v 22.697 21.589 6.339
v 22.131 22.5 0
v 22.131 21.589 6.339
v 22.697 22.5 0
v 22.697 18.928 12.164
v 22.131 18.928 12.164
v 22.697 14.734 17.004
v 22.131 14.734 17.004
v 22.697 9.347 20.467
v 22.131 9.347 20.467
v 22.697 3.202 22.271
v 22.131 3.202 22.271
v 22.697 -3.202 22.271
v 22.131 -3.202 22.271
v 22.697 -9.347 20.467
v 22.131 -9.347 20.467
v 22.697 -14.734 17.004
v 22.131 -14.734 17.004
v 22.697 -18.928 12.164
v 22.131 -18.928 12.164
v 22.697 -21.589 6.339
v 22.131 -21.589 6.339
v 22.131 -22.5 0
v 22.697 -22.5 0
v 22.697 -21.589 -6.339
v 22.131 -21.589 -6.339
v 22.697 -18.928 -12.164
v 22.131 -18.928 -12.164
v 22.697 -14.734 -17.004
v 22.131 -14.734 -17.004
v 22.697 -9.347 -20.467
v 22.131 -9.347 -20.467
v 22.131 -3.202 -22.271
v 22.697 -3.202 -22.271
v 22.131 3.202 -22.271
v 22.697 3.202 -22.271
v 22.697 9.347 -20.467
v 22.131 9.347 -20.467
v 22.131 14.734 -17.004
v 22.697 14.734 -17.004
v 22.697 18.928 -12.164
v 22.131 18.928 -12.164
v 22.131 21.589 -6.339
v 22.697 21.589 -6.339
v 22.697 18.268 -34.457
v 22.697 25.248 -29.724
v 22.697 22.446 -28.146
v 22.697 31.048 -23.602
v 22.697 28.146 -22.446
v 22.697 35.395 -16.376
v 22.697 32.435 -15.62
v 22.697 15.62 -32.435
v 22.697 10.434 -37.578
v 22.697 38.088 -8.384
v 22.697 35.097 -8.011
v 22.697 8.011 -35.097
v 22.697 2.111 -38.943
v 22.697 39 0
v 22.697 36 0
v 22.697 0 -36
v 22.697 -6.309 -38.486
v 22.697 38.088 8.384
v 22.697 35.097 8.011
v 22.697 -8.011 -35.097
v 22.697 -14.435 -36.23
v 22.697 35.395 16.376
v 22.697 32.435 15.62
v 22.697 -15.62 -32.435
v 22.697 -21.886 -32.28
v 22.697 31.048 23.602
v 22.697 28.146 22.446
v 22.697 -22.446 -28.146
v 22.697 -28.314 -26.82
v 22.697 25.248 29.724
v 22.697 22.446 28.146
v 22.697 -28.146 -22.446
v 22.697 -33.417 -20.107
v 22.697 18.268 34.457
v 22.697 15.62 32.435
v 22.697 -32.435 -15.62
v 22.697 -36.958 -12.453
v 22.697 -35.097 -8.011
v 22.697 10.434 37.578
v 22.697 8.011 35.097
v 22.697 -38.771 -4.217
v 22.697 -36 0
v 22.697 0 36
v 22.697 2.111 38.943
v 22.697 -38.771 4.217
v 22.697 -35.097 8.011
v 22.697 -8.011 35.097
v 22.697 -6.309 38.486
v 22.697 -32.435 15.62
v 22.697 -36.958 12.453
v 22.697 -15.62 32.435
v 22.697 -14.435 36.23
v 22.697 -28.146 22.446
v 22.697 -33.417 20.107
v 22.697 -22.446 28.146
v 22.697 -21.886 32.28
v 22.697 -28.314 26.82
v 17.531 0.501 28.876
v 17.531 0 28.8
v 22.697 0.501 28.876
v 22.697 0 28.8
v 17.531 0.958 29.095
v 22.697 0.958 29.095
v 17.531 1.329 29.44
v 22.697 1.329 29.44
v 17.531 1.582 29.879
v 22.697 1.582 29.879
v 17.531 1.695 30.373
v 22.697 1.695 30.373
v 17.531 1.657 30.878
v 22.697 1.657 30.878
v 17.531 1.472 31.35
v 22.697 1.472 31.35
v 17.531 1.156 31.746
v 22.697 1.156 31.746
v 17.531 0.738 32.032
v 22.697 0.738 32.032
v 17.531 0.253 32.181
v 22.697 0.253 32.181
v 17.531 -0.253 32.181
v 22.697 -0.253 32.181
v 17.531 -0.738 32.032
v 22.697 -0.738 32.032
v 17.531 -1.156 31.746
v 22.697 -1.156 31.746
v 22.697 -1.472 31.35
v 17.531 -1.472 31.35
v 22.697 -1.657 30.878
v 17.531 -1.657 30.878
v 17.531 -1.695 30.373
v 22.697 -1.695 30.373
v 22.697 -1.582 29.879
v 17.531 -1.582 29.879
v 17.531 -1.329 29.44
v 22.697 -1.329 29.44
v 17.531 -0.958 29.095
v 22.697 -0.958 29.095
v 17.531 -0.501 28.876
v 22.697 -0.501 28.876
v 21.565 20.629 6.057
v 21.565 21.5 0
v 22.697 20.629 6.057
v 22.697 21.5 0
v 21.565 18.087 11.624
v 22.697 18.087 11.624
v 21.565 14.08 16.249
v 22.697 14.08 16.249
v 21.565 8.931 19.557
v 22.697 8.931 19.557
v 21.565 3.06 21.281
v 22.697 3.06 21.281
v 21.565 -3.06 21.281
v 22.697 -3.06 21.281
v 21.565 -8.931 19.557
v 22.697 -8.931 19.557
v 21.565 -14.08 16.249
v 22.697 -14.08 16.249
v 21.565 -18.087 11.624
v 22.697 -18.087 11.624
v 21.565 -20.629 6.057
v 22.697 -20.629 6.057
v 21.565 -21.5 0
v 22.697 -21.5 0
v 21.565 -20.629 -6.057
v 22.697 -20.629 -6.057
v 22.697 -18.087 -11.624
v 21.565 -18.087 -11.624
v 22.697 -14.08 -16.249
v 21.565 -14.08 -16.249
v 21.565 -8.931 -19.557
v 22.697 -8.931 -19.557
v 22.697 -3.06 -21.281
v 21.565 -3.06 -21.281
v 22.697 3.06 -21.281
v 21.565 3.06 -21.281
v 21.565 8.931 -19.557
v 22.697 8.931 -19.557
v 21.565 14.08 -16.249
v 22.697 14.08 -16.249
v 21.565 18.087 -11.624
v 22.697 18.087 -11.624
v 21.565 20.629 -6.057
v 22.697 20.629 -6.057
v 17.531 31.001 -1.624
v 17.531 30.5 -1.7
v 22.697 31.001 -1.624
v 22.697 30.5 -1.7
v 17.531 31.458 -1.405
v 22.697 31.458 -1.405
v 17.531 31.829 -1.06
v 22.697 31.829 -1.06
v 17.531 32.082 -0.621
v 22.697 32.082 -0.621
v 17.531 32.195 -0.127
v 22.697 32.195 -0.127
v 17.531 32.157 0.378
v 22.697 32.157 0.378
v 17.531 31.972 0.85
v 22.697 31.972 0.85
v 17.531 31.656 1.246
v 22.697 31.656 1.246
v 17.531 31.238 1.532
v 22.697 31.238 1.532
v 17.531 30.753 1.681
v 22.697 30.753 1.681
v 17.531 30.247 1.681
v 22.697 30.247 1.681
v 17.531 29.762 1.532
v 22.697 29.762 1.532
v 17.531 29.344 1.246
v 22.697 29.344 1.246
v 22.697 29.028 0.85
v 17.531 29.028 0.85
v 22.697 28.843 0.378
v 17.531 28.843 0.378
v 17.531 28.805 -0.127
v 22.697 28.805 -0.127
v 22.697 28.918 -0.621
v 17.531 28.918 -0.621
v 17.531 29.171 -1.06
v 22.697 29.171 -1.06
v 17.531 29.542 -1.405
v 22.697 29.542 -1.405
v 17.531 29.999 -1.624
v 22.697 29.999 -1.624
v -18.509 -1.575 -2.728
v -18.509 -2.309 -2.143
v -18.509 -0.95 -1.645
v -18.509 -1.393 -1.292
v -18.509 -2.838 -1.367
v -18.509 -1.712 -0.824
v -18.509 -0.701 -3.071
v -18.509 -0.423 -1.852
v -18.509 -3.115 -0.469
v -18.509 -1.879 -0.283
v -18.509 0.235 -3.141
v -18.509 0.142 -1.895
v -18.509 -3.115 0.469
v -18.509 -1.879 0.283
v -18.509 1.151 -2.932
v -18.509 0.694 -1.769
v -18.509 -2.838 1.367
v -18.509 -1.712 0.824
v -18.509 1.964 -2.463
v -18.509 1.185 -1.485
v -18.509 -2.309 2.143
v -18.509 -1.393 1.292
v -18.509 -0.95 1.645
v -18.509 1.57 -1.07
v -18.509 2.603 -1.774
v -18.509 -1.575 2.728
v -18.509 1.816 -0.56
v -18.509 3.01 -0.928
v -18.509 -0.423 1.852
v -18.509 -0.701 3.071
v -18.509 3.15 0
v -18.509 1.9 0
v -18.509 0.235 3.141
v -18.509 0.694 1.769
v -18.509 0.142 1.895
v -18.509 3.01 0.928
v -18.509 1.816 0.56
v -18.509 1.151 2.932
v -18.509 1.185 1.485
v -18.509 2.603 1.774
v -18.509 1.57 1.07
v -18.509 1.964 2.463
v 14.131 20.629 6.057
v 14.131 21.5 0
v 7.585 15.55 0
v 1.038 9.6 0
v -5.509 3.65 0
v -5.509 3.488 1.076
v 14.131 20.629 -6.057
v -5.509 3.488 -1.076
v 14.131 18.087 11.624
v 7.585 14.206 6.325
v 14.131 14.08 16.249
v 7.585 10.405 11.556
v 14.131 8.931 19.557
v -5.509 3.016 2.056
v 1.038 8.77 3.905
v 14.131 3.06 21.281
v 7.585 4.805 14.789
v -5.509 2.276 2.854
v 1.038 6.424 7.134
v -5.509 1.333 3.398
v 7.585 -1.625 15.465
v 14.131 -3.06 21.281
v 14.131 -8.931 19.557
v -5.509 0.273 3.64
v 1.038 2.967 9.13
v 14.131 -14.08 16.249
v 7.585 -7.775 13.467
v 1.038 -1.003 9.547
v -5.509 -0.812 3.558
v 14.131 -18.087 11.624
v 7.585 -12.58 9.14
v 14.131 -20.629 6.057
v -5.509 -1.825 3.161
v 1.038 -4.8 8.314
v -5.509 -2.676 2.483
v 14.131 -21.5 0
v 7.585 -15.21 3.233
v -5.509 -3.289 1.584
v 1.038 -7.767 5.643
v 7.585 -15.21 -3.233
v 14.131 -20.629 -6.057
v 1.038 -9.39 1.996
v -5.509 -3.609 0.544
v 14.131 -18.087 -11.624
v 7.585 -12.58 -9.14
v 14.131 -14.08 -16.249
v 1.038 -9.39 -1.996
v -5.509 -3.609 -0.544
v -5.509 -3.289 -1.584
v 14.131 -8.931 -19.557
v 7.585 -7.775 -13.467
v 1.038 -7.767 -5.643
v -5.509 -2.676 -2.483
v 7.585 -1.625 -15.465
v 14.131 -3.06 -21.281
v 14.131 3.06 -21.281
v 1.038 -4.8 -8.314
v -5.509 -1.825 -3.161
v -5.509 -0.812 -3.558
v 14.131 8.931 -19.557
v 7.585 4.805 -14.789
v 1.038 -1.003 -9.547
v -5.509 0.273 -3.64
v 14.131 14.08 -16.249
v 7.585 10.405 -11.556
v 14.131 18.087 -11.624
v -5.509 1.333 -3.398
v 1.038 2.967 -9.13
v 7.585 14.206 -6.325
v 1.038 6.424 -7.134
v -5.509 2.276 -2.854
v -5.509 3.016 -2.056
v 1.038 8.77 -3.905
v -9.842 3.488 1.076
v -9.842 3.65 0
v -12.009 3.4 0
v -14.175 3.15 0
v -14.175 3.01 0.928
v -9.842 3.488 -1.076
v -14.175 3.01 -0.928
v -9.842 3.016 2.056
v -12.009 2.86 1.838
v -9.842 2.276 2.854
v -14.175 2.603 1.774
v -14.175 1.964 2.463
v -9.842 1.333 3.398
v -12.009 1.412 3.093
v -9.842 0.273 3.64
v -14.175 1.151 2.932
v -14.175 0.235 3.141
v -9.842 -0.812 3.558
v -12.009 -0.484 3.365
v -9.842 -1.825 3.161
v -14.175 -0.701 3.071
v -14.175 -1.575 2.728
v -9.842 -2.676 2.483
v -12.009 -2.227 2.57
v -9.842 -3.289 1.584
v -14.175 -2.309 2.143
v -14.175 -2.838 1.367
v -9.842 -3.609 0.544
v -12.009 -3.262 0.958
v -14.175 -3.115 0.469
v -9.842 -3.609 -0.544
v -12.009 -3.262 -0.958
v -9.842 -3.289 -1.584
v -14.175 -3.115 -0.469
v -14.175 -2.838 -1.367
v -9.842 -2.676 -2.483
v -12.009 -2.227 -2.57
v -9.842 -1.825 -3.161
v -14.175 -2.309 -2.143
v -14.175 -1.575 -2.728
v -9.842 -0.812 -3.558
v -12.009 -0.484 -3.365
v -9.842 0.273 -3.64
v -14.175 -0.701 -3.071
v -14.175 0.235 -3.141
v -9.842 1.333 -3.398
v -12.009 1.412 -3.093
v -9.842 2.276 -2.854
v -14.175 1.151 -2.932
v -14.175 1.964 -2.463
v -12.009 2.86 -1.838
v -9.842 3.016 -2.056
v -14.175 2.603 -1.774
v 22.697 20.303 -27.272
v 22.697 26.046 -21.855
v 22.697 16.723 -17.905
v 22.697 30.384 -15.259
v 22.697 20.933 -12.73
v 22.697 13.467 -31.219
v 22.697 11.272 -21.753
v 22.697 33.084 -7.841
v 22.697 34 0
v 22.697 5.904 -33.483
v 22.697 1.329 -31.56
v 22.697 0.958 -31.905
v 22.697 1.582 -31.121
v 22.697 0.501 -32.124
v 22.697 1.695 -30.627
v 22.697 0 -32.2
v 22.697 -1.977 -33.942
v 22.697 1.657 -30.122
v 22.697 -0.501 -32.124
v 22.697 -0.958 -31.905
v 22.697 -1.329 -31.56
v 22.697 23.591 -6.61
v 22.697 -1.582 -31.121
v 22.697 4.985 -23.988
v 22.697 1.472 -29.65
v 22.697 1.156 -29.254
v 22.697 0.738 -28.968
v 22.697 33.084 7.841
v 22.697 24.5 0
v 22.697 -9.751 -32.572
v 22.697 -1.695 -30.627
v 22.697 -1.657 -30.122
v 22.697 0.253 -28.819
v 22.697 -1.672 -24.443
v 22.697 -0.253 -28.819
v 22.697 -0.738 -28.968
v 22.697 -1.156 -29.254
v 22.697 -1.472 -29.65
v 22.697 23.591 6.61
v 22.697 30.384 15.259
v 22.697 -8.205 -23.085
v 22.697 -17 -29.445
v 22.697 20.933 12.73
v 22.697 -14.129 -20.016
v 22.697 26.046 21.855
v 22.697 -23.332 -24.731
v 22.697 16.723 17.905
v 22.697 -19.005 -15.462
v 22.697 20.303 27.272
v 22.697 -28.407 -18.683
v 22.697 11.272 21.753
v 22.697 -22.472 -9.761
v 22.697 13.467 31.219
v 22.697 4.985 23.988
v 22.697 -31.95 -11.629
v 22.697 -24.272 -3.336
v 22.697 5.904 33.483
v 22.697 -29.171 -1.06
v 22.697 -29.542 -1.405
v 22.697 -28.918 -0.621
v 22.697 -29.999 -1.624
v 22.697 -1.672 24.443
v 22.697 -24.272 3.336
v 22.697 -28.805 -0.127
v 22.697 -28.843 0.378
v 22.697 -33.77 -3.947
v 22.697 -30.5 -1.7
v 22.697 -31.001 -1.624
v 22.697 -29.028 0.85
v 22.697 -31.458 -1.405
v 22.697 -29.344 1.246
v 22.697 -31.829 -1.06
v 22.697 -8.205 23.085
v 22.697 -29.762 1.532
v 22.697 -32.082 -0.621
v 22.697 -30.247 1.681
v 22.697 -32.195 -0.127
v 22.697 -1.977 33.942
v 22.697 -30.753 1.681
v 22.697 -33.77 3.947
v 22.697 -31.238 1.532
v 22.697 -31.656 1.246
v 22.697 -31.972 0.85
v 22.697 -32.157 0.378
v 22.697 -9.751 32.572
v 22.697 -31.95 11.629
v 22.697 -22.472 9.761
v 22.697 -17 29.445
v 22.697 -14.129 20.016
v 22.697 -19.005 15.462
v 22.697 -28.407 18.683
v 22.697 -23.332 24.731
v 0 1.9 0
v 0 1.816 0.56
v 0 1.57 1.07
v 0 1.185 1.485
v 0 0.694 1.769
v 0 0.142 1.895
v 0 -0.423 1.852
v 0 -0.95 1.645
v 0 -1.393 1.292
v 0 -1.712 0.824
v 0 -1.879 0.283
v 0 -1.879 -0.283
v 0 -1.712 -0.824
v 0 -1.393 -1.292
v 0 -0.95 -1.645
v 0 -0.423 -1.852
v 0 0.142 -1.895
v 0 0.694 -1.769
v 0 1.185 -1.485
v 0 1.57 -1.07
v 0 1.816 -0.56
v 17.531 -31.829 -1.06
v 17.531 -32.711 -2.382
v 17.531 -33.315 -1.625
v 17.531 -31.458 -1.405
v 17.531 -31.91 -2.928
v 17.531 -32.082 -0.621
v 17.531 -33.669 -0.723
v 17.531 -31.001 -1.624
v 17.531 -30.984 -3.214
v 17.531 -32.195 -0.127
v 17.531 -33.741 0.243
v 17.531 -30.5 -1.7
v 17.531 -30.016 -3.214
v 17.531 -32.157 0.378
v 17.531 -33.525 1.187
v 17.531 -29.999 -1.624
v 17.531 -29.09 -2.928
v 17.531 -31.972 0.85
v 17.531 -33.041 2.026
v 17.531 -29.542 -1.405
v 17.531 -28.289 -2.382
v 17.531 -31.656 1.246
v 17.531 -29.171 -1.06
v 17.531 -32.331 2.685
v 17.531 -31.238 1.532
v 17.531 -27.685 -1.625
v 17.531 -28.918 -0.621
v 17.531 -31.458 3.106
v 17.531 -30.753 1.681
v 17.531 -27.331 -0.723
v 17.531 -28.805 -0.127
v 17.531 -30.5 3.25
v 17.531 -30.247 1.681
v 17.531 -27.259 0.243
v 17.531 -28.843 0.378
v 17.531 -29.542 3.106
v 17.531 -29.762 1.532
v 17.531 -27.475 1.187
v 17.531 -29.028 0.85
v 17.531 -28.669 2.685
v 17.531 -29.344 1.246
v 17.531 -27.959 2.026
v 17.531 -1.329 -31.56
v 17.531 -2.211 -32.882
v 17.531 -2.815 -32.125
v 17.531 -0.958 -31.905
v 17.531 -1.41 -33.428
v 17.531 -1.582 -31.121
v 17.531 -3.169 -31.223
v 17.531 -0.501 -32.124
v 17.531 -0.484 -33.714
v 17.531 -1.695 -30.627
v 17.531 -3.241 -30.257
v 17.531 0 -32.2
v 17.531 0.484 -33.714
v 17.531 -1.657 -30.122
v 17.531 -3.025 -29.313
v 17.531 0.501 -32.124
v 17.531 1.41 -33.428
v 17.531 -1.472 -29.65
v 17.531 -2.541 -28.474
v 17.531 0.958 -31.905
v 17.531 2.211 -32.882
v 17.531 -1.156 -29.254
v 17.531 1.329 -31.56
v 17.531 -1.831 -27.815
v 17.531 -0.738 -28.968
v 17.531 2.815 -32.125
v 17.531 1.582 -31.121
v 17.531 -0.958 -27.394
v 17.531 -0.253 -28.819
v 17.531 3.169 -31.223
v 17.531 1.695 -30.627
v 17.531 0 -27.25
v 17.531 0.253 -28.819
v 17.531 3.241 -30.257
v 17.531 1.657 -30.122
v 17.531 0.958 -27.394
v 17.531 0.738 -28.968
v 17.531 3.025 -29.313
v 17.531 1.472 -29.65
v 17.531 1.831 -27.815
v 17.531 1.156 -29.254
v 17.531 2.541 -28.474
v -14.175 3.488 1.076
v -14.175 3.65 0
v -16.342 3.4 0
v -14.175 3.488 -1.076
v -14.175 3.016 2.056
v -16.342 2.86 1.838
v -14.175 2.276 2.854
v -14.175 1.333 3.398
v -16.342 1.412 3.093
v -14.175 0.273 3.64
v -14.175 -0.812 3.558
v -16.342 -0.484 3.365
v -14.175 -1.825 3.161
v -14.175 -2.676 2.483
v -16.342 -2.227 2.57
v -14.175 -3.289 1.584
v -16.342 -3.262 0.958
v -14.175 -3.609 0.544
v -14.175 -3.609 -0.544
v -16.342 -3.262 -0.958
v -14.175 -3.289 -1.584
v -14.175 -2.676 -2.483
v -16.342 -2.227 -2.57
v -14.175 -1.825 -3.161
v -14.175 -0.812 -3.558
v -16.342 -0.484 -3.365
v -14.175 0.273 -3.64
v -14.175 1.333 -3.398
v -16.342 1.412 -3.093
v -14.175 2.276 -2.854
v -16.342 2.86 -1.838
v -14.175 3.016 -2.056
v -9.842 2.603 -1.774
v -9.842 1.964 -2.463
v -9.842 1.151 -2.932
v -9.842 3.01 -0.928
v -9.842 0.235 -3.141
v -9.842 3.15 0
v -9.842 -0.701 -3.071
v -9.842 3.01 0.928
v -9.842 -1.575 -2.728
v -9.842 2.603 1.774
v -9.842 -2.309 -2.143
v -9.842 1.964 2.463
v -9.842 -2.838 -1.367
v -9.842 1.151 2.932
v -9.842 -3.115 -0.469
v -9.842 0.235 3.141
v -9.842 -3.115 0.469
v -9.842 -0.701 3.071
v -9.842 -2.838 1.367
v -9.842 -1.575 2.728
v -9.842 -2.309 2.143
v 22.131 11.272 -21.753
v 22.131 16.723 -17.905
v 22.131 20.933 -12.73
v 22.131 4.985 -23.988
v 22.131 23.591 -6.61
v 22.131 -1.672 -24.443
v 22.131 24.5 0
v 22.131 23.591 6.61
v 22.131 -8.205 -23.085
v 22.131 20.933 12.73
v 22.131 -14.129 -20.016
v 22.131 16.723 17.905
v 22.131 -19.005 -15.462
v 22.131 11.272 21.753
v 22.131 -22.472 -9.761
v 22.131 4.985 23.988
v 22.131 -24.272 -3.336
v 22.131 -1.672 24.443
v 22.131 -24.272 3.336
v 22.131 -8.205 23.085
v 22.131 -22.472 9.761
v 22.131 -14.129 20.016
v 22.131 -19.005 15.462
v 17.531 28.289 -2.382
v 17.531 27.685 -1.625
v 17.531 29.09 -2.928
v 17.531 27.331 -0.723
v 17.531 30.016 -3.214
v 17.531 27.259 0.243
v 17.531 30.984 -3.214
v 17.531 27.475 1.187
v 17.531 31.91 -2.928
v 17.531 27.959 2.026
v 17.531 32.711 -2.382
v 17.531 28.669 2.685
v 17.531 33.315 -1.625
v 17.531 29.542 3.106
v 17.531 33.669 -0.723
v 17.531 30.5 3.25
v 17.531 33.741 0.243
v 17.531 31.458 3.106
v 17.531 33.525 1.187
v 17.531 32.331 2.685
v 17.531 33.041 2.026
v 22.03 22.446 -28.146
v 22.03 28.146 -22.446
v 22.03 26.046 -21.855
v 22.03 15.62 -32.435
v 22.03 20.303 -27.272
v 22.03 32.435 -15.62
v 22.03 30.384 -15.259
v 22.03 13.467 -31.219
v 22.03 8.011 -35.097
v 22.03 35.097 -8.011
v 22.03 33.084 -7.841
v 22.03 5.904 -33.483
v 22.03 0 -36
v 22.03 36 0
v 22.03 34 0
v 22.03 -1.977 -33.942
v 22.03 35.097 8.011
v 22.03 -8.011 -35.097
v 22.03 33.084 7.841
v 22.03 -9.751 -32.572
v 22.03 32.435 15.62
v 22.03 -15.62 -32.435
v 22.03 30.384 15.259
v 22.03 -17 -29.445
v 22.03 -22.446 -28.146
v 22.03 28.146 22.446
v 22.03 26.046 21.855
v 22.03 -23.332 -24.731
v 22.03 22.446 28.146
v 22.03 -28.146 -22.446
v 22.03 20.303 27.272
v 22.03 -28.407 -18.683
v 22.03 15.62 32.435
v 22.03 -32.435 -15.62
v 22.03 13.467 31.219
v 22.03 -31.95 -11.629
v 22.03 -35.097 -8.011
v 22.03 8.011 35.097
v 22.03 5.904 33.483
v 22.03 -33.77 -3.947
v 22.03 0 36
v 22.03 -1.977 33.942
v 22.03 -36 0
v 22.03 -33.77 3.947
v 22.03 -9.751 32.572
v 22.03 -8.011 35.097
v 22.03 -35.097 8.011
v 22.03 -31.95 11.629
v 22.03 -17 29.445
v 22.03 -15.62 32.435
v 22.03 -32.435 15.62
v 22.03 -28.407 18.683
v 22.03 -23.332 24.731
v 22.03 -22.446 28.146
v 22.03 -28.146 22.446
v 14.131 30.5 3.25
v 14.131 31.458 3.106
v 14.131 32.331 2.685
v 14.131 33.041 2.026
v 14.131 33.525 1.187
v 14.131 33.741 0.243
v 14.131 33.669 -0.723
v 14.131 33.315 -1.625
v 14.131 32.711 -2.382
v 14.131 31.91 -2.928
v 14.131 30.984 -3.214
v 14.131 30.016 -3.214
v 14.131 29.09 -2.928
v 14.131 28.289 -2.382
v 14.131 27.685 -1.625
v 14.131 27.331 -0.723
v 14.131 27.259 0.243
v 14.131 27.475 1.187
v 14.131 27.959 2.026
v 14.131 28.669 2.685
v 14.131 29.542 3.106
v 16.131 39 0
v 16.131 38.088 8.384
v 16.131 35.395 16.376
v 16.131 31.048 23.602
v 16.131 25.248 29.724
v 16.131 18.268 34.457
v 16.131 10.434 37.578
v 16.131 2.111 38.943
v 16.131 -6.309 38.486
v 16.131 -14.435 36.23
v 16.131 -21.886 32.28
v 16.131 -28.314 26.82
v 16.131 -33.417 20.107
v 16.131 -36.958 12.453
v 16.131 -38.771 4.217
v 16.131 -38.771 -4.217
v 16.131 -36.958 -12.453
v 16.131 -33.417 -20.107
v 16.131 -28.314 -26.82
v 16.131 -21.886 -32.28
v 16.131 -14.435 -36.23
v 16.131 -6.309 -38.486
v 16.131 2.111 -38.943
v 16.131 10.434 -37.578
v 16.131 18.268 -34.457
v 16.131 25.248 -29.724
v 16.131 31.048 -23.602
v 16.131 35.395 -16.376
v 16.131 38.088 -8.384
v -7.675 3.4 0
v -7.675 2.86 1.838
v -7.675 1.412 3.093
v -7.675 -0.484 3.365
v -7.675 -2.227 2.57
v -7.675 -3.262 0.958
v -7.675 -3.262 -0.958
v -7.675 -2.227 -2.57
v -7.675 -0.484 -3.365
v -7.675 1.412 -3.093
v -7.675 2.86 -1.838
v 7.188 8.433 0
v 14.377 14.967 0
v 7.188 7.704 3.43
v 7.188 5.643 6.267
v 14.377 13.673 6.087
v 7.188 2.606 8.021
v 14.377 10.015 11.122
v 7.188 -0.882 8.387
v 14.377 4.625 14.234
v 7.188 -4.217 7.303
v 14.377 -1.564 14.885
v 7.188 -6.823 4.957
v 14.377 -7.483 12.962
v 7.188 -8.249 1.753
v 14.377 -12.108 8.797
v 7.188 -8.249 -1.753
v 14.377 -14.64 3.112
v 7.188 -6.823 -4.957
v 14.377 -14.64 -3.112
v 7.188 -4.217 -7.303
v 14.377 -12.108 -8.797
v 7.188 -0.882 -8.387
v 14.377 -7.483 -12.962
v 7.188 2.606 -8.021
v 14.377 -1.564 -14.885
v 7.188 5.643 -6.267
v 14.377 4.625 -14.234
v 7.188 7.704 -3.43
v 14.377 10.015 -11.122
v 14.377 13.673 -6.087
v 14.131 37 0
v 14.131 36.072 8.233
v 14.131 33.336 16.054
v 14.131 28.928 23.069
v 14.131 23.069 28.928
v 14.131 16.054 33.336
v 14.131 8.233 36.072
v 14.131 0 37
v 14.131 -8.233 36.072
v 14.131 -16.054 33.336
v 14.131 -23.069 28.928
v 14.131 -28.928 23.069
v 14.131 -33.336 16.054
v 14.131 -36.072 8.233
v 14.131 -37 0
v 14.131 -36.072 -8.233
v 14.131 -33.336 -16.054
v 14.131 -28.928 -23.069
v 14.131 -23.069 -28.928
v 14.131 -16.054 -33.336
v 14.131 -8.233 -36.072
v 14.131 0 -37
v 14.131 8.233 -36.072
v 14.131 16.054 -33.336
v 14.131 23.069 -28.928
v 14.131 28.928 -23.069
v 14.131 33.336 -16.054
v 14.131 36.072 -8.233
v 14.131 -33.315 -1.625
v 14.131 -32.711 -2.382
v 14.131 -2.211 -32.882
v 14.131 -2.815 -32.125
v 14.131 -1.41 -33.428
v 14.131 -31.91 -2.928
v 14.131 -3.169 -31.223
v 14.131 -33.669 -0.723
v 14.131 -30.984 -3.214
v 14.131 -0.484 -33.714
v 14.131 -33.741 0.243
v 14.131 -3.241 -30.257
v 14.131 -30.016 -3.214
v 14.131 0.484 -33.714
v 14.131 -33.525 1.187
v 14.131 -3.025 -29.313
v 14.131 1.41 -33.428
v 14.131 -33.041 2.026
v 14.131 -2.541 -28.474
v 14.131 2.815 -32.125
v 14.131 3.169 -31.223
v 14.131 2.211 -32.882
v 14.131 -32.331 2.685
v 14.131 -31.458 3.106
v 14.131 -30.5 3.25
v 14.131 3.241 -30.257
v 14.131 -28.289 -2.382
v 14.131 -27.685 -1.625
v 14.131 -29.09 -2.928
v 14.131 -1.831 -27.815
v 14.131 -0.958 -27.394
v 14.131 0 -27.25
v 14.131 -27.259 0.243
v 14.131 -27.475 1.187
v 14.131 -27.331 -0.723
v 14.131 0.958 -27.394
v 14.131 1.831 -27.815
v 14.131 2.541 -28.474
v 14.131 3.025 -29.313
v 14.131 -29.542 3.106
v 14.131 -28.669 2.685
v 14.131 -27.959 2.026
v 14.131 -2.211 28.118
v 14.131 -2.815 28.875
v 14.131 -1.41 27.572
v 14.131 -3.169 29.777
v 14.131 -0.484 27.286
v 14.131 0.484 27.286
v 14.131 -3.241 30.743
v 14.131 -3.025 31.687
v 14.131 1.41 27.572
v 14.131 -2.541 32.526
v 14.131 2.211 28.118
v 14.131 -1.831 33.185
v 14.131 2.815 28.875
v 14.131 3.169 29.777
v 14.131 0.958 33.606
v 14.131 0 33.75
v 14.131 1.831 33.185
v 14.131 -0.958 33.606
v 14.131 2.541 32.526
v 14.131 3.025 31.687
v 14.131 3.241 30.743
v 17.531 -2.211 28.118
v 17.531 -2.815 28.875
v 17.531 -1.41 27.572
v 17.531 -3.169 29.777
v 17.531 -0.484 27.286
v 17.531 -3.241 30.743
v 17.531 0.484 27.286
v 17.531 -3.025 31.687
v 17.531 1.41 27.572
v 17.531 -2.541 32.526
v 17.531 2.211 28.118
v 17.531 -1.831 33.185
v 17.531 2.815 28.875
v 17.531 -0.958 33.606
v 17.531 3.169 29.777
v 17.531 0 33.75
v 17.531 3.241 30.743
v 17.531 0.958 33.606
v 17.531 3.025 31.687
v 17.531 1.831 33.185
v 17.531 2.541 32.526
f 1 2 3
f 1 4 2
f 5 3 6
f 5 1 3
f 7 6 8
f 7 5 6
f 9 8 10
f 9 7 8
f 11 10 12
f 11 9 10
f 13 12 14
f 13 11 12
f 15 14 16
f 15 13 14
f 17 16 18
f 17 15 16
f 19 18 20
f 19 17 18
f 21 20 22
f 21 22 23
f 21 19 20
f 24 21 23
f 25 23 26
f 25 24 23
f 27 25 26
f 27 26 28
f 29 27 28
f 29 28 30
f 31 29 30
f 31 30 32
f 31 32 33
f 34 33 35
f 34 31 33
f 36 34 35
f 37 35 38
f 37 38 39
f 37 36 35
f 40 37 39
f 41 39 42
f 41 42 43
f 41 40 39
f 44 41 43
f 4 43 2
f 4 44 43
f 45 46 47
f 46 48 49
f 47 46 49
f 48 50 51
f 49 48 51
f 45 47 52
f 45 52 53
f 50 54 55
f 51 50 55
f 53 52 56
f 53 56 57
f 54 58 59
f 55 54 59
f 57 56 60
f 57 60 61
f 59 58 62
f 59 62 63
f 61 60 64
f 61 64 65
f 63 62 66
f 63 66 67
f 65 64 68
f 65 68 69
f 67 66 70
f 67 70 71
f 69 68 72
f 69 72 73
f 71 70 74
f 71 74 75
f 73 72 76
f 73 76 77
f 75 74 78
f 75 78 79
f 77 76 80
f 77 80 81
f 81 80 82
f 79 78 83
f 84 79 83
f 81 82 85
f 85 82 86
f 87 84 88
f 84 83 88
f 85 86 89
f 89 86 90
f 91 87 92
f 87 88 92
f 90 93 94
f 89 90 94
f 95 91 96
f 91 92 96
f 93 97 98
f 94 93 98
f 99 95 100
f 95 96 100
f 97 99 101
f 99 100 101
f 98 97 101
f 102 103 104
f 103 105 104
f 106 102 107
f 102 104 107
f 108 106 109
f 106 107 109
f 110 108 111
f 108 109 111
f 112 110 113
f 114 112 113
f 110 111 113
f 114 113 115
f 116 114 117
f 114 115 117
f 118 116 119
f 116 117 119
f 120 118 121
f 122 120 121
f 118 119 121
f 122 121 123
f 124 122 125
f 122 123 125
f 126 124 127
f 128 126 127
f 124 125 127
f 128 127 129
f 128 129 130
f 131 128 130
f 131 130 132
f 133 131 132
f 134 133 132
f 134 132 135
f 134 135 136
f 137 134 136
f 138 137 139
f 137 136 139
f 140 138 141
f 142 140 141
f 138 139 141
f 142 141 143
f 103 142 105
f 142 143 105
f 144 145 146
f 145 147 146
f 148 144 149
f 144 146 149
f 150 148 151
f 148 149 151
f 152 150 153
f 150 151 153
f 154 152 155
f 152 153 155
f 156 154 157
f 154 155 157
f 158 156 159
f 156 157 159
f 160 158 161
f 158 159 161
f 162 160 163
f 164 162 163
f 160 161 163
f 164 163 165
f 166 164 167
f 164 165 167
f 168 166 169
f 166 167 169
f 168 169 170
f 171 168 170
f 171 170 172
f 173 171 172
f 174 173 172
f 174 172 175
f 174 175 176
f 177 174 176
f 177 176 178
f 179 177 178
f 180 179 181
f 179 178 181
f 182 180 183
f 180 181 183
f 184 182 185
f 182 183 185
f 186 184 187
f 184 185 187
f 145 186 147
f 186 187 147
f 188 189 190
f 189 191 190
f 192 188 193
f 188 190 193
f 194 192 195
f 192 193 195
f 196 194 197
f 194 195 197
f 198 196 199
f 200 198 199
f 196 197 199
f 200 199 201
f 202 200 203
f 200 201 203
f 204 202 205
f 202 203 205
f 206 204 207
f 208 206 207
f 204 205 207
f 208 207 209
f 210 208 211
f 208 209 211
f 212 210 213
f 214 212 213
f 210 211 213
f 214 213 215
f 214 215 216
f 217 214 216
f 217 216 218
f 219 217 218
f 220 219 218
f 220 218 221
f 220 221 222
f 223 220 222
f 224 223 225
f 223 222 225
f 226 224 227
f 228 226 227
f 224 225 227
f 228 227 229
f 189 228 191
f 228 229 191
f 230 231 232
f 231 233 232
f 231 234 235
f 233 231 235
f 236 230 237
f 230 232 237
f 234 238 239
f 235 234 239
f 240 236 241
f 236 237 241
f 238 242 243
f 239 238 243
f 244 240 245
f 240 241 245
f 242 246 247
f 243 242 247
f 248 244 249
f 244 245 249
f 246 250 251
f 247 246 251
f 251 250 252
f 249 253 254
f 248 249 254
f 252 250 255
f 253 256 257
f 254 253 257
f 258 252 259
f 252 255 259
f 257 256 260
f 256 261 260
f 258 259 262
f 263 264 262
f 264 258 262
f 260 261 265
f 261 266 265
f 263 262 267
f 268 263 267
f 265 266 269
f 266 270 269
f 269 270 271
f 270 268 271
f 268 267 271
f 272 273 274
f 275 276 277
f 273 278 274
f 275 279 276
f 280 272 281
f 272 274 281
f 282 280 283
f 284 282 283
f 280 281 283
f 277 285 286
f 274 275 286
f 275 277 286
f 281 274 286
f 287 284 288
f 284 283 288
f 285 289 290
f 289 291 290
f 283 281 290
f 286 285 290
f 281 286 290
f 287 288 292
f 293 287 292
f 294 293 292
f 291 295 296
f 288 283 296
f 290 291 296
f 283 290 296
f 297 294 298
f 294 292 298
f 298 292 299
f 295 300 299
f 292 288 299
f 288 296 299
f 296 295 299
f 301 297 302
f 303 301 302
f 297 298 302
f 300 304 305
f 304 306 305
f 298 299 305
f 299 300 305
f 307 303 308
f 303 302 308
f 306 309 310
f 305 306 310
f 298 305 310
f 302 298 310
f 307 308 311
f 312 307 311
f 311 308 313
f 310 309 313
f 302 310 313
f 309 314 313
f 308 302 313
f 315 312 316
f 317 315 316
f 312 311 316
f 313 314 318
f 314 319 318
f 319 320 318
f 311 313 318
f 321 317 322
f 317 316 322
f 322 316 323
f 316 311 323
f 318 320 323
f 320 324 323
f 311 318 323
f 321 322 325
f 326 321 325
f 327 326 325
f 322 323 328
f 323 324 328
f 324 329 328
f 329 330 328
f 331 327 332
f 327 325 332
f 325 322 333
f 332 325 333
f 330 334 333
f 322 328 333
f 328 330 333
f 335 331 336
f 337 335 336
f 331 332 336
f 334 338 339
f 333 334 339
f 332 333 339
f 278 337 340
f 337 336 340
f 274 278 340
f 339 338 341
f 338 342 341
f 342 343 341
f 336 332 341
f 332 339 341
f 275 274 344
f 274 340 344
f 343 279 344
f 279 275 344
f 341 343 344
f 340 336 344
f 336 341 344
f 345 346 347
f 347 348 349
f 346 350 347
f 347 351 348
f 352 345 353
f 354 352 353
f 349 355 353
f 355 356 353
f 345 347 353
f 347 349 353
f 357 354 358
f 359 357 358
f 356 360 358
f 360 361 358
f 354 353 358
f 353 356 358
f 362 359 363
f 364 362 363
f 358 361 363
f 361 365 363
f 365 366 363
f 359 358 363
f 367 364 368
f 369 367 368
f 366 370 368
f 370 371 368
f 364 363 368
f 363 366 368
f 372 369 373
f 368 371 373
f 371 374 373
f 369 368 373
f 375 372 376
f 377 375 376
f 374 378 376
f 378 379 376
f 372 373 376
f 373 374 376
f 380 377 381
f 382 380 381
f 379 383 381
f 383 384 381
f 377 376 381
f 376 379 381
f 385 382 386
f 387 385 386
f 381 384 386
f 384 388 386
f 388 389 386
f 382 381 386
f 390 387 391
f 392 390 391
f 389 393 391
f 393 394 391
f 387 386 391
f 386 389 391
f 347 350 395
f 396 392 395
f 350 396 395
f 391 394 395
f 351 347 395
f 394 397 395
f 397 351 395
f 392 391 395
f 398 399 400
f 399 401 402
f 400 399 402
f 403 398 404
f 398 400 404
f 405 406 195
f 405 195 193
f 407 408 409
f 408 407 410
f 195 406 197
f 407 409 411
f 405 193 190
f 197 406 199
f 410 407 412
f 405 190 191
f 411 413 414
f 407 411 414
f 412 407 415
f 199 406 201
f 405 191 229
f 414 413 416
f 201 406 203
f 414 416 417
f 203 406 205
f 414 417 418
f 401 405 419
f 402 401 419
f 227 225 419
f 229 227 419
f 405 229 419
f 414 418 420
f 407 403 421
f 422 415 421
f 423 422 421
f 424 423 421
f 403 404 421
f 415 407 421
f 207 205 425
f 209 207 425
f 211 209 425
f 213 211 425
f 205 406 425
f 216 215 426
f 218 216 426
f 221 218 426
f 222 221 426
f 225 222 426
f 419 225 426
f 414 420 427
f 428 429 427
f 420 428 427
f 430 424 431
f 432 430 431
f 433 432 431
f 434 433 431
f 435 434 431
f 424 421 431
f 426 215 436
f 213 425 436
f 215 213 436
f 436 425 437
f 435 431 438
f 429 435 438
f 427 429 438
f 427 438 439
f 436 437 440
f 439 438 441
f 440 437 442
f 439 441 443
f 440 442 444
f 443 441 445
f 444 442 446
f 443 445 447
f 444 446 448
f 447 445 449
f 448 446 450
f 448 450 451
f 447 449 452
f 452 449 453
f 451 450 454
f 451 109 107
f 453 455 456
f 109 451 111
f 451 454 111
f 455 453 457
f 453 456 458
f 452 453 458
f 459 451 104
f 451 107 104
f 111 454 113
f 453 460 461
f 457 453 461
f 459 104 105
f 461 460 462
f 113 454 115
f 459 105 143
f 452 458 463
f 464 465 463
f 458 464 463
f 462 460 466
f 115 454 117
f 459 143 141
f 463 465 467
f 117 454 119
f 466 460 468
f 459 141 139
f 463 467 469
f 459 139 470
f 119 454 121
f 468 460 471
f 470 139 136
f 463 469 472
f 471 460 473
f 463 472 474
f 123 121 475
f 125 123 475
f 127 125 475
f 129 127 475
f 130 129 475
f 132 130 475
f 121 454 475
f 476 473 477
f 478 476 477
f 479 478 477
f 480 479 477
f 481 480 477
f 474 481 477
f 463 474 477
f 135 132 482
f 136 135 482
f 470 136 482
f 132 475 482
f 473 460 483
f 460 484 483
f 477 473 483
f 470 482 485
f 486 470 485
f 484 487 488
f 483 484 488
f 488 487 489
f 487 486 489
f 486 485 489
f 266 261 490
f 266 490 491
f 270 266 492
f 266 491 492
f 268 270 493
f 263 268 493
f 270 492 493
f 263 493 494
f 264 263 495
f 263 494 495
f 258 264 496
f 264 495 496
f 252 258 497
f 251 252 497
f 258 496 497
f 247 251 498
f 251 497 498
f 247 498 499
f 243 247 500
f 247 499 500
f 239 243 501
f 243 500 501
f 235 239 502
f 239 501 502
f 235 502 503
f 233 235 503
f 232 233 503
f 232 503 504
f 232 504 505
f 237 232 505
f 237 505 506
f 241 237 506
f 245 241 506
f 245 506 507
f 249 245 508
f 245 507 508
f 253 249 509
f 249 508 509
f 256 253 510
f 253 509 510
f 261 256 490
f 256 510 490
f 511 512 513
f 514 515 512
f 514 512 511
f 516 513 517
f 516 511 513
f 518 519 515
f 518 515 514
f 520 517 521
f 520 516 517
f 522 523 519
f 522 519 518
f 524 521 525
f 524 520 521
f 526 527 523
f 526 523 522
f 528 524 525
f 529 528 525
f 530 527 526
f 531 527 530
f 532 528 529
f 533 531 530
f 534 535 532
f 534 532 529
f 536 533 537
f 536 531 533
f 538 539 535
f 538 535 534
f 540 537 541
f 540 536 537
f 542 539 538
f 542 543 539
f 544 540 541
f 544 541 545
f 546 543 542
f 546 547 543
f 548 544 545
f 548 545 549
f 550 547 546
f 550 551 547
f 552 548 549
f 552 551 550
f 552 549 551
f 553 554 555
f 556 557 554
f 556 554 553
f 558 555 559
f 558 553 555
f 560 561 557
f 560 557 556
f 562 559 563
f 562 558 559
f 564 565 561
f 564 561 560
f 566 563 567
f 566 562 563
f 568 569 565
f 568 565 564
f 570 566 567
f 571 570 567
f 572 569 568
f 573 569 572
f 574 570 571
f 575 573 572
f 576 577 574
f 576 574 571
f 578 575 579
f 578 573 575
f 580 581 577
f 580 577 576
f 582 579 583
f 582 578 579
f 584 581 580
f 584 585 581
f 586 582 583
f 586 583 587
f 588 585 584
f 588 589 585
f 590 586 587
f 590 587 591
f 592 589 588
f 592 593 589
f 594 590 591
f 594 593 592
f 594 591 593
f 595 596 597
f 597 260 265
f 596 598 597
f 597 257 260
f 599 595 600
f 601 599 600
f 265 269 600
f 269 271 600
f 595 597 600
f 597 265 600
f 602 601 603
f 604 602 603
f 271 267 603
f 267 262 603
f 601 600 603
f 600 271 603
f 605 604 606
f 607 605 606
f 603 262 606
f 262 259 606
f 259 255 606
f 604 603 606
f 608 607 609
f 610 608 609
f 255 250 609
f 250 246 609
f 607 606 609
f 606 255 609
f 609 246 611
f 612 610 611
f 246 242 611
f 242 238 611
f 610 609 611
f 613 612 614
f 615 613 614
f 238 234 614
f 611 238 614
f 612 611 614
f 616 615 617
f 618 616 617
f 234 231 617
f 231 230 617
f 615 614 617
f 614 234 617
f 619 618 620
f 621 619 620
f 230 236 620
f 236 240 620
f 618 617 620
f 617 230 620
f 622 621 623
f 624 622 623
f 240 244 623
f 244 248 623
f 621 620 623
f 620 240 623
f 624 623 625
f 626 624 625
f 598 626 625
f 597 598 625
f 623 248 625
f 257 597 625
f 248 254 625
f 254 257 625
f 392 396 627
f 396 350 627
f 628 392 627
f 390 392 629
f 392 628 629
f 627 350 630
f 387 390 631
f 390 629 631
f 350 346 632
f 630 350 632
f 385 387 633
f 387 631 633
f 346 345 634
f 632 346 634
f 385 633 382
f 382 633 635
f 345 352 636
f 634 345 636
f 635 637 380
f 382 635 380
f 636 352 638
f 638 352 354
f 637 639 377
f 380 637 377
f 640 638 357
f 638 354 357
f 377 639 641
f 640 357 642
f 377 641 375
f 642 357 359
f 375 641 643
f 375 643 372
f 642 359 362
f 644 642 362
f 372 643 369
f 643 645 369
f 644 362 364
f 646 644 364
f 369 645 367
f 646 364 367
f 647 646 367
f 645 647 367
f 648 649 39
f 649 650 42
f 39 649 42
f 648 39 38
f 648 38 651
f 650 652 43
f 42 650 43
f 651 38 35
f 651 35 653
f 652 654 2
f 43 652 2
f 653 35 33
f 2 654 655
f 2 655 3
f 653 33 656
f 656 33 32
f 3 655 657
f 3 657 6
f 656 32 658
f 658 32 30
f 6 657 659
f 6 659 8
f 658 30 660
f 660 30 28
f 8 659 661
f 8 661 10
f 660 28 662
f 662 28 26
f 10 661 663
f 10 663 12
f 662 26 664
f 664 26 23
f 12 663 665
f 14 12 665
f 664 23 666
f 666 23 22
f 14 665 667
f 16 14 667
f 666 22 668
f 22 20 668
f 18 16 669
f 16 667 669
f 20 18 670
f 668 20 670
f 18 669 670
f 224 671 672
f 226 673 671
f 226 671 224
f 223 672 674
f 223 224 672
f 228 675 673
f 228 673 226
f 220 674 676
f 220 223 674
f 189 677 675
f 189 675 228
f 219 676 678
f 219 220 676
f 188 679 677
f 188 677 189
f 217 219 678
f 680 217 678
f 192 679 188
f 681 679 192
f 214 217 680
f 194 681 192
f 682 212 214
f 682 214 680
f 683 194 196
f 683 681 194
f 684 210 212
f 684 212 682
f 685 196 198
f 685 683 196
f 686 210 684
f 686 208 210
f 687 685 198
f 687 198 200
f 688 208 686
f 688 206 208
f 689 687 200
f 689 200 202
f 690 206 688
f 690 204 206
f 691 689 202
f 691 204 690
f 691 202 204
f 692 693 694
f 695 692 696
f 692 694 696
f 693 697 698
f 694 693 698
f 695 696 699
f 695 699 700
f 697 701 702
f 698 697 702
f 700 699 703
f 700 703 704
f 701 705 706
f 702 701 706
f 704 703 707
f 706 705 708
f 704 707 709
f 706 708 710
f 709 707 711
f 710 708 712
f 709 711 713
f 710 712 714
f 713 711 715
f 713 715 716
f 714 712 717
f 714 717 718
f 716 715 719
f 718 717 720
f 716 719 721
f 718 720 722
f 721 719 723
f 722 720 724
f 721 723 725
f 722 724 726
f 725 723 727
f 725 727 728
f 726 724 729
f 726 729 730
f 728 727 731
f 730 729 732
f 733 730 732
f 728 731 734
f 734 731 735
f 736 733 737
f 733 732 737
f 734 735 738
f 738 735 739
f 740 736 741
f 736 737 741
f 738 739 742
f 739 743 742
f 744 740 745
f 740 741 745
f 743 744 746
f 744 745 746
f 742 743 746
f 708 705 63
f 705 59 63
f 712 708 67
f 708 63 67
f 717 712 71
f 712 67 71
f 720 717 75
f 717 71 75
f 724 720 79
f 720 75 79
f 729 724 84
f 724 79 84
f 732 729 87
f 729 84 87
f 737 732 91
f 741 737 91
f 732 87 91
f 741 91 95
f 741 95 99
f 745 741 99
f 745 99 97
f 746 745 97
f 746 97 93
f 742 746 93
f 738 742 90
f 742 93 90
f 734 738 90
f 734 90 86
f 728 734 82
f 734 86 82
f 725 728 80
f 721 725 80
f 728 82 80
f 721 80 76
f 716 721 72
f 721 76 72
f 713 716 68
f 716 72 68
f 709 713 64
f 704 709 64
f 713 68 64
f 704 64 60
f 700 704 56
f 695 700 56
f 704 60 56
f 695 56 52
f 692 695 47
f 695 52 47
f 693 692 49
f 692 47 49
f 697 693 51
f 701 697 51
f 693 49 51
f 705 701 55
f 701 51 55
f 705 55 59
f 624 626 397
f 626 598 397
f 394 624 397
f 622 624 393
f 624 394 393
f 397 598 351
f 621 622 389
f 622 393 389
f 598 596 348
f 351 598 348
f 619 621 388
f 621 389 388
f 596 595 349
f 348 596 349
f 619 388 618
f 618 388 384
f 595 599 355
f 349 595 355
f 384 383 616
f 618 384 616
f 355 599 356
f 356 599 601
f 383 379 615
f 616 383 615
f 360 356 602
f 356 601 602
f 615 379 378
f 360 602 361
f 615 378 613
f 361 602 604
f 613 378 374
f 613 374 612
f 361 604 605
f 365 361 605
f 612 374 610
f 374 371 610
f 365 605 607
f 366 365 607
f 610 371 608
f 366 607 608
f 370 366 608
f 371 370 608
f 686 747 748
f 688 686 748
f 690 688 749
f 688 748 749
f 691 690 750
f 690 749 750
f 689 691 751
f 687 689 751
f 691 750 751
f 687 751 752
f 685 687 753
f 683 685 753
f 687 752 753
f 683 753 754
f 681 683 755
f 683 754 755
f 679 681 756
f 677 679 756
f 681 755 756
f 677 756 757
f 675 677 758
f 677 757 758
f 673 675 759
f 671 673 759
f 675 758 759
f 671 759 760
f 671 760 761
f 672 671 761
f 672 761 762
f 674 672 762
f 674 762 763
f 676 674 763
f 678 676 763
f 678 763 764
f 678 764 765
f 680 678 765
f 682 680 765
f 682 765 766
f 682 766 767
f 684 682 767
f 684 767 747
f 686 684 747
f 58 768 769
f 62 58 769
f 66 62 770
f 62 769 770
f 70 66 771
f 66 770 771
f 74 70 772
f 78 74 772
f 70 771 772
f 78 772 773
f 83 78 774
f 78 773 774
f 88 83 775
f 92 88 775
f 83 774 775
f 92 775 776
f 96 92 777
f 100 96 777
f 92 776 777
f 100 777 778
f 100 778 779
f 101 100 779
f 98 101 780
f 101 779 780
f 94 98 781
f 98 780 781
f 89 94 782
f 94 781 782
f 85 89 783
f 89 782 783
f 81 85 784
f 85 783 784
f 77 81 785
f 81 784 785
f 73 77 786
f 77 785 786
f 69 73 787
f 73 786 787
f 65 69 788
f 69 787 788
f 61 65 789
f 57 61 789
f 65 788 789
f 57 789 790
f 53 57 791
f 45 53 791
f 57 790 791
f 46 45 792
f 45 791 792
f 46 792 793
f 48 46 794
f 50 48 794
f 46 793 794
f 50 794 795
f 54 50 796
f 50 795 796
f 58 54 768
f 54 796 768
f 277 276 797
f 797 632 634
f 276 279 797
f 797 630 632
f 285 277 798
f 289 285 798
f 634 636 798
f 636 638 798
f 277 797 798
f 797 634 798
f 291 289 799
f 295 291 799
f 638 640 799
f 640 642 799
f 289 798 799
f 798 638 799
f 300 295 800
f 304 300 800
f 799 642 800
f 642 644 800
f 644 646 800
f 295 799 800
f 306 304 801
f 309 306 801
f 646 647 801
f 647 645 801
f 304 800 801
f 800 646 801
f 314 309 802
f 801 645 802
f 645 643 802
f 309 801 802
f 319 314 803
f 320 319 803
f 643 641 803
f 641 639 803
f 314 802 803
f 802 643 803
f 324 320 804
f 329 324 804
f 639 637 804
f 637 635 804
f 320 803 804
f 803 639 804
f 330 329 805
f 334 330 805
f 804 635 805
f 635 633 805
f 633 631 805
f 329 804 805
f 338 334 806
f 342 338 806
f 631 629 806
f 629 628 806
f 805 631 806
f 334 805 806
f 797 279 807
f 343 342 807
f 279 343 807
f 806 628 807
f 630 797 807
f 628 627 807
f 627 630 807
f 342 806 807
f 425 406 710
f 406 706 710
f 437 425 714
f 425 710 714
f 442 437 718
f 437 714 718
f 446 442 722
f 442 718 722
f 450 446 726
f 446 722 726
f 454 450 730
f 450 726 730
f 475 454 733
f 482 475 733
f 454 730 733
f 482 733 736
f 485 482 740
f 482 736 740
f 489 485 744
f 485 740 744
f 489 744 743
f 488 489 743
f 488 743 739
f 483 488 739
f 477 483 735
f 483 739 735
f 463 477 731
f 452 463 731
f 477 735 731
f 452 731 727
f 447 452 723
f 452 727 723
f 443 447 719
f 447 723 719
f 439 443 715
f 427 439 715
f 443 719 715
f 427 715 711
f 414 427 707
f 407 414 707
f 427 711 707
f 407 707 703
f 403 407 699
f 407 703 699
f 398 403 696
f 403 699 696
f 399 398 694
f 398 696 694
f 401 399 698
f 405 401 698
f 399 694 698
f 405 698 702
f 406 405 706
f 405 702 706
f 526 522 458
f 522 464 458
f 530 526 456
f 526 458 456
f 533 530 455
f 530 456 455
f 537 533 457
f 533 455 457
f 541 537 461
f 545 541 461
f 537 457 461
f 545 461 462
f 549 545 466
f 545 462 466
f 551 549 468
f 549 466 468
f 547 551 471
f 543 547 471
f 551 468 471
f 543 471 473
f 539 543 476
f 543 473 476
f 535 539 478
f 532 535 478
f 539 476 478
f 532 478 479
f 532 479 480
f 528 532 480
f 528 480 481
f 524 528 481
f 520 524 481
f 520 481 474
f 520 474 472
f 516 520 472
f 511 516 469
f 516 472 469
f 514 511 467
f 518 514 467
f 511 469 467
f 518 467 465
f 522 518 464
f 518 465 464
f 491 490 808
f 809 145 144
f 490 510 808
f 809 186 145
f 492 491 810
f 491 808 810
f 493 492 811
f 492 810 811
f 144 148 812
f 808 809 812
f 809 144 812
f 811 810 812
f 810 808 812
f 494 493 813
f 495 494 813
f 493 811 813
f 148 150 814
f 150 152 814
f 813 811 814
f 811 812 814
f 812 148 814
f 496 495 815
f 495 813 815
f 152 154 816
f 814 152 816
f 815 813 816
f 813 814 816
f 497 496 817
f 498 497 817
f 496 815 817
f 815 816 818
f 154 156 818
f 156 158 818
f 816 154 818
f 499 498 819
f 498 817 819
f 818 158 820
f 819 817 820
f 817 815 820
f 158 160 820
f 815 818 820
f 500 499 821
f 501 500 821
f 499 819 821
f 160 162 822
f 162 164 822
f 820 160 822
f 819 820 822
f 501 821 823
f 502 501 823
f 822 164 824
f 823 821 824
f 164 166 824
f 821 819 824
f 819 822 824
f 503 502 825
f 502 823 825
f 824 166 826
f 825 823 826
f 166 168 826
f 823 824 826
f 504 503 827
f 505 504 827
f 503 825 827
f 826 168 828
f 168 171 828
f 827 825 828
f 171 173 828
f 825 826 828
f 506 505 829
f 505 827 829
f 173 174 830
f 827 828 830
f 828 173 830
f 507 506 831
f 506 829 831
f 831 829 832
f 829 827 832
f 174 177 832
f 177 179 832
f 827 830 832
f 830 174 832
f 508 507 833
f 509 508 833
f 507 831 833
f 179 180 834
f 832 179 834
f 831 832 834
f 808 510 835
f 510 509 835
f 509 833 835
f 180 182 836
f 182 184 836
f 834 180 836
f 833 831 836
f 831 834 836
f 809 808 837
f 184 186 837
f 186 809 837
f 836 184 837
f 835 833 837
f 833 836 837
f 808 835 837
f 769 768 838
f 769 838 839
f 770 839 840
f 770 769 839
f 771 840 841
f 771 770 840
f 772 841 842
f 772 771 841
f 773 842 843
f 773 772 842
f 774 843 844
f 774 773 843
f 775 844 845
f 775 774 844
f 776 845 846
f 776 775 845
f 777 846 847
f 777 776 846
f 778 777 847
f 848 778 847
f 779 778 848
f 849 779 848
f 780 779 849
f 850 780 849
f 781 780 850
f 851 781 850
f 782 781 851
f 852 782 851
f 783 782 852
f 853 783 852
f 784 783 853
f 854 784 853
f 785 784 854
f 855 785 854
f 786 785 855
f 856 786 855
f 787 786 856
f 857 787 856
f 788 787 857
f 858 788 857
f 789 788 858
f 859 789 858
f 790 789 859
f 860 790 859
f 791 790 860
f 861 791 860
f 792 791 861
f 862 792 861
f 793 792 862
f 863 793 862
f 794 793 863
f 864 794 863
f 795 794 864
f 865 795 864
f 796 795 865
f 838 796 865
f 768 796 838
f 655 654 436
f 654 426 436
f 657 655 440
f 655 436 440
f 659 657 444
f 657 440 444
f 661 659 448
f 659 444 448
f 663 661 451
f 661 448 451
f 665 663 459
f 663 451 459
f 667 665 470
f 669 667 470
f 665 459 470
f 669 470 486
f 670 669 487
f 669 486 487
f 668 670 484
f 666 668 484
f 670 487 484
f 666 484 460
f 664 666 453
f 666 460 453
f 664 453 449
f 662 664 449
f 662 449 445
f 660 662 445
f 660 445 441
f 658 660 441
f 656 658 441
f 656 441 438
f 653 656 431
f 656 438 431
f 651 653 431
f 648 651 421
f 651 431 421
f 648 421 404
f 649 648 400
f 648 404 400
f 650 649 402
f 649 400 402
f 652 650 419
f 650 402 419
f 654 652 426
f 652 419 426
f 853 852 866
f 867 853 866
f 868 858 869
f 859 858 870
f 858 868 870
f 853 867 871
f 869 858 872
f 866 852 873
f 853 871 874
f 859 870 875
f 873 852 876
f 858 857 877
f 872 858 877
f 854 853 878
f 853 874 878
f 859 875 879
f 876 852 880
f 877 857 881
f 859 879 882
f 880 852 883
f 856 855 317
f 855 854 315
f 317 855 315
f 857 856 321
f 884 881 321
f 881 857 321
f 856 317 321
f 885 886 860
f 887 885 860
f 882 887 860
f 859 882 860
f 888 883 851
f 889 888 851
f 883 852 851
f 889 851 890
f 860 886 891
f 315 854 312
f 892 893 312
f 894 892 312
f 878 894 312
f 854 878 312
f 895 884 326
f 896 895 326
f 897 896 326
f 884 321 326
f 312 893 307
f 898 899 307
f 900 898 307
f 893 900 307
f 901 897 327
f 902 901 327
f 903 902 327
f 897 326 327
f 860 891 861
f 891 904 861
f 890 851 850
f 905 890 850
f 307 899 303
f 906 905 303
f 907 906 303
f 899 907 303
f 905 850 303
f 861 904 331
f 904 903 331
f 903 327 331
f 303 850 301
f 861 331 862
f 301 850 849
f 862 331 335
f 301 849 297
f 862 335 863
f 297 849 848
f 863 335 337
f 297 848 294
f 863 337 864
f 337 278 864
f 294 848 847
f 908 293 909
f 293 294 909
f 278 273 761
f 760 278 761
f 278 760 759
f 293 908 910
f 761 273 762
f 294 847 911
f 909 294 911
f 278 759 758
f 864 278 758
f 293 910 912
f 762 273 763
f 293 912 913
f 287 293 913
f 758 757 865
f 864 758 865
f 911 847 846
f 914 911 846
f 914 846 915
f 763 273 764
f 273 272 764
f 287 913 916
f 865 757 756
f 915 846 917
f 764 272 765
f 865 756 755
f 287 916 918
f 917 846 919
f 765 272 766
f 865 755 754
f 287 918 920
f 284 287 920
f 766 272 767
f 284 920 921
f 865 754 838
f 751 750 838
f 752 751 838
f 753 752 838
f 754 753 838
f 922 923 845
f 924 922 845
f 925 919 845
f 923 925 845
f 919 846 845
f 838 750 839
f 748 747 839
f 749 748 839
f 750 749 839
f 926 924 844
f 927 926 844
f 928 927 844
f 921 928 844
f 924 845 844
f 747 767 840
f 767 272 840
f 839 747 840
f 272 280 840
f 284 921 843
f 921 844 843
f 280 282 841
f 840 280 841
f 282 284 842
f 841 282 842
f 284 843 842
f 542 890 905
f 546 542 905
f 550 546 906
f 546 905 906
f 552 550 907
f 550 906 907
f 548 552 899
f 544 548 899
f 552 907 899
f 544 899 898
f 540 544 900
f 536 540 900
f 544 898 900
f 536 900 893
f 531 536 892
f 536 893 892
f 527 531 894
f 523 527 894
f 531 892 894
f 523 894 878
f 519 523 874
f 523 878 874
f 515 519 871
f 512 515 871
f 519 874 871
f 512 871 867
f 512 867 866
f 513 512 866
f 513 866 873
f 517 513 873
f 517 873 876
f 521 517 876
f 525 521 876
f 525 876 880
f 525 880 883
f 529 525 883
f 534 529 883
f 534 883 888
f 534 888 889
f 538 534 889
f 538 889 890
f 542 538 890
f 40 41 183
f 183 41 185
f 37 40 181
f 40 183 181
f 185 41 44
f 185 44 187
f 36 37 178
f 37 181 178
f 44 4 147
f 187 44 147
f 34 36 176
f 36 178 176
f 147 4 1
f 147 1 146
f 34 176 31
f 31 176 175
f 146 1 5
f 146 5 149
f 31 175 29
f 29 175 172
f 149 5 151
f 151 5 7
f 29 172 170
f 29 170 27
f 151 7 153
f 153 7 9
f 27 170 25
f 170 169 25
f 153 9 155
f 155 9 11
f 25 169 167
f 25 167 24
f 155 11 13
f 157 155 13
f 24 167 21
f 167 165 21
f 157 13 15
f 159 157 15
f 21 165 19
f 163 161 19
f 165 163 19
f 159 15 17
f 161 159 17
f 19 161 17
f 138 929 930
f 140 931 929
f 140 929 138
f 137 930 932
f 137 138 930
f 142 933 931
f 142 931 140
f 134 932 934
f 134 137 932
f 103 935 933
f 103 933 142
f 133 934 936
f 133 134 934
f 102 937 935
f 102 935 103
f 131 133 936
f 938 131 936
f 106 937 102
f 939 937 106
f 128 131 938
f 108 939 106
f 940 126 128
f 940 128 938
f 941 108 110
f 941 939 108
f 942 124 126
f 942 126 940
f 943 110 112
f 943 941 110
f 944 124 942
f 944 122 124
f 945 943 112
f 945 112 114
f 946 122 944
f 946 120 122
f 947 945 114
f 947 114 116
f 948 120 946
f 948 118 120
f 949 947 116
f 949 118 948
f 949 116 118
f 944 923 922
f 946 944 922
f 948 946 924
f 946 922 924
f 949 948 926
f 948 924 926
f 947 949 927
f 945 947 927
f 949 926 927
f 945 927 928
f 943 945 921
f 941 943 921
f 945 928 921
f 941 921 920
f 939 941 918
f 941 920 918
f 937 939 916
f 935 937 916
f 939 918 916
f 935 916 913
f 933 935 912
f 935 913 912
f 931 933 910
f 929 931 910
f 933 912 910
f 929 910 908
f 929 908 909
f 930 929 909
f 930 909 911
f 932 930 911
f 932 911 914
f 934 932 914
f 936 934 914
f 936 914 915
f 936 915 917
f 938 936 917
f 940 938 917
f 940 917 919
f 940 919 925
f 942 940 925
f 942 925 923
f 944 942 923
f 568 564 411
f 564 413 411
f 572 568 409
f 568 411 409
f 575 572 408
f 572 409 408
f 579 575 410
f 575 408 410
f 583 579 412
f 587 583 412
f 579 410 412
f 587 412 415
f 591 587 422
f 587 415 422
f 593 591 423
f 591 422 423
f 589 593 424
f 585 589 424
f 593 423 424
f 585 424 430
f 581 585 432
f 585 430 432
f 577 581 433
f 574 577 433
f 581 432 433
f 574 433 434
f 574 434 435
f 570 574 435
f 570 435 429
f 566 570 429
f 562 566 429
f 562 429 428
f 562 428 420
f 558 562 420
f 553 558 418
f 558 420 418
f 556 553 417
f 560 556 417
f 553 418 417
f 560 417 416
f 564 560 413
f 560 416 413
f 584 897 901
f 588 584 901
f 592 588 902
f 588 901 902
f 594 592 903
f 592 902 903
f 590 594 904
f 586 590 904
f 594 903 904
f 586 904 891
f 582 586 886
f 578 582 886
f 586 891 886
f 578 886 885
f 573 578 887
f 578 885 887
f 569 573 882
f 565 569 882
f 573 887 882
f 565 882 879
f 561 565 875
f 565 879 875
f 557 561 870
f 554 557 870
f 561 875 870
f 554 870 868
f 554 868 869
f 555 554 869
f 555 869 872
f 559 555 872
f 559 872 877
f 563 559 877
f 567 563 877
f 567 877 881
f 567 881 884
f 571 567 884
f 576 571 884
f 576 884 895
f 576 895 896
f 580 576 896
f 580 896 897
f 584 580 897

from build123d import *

# Parameters (mm, degrees)
SKETCH1_W                                           = 0.566
SKETCH1_H                                           = 1
CBORE_FOR_M3_HEX_SOCKET_HEAD_CAP_SCREW2_D           = 3.4
CBORE_FOR_M3_HEX_SOCKET_HEAD_CAP_SCREW2_DEPTH       = 8.566
CBORE_FOR_M3_HEX_SOCKET_HEAD_CAP_SCREW2_CBORE_D     = 6.5
CBORE_FOR_M3_HEX_SOCKET_HEAD_CAP_SCREW2_CBORE_DEPTH = 3.4
CBORE_FOR_M3_HEX_SOCKET_HEAD_CAP_SCREW2_TIP         = 1.021463052
CHAMFER1_SIZE                                       = 2


with BuildPart() as part:
    # Sketch1 → Revolve17 (revolve)
    with BuildSketch(Plane.XY):
        Polygon((-14.175209939, 3.15), (-14.175209939, 3.65), (-18.508543272, 3.15), (-18.508543272, 1.9), (0, 1.9), (21.56511535, 21.5), (22.13111535, 21.5), (22.13111535, 22.5), (22.13111535, 24.5), (22.69711535, 24.5), (22.69711535, 34), (22.03011535, 34), (22.03011535, 36), (22.69711535, 36), (22.69711535, 39), (14.13111535, 39), (14.13111535, 21.5), (-5.508543272, 3.65), (-9.841876606, 3.15), (-9.841876606, 3.65), align=None)
        with Locations((22.41411535, 22)):
            Rectangle(SKETCH1_W, SKETCH1_H)
    revolve(axis=Axis((-801.920554309, 0, 0), (1, 0, 0)))

    # CBORE for M3 Hex Socket Head Cap Screw2
    with Locations(Plane.ZY.offset(-14.13111535)):
        with Locations((0, -30.5), (0, 30.5), (30.5, 0), (-30.5, 0)):
            CounterBoreHole(CBORE_FOR_M3_HEX_SOCKET_HEAD_CAP_SCREW2_D / 2, CBORE_FOR_M3_HEX_SOCKET_HEAD_CAP_SCREW2_CBORE_D / 2, CBORE_FOR_M3_HEX_SOCKET_HEAD_CAP_SCREW2_CBORE_DEPTH, depth=CBORE_FOR_M3_HEX_SOCKET_HEAD_CAP_SCREW2_DEPTH)
            with Locations((0, 0, -(CBORE_FOR_M3_HEX_SOCKET_HEAD_CAP_SCREW2_DEPTH + CBORE_FOR_M3_HEX_SOCKET_HEAD_CAP_SCREW2_TIP / 2))):  # 118° drill point
                Cone(0, CBORE_FOR_M3_HEX_SOCKET_HEAD_CAP_SCREW2_D / 2, CBORE_FOR_M3_HEX_SOCKET_HEAD_CAP_SCREW2_TIP, mode=Mode.SUBTRACT)

    # Chamfer1
    chamfer1_edges = [part.edges().sort_by_distance(p)[0] for p in [
        (14.13111535, -39, 0),
    ]]
    chamfer(chamfer1_edges, length=CHAMFER1_SIZE)


solid = part.part
